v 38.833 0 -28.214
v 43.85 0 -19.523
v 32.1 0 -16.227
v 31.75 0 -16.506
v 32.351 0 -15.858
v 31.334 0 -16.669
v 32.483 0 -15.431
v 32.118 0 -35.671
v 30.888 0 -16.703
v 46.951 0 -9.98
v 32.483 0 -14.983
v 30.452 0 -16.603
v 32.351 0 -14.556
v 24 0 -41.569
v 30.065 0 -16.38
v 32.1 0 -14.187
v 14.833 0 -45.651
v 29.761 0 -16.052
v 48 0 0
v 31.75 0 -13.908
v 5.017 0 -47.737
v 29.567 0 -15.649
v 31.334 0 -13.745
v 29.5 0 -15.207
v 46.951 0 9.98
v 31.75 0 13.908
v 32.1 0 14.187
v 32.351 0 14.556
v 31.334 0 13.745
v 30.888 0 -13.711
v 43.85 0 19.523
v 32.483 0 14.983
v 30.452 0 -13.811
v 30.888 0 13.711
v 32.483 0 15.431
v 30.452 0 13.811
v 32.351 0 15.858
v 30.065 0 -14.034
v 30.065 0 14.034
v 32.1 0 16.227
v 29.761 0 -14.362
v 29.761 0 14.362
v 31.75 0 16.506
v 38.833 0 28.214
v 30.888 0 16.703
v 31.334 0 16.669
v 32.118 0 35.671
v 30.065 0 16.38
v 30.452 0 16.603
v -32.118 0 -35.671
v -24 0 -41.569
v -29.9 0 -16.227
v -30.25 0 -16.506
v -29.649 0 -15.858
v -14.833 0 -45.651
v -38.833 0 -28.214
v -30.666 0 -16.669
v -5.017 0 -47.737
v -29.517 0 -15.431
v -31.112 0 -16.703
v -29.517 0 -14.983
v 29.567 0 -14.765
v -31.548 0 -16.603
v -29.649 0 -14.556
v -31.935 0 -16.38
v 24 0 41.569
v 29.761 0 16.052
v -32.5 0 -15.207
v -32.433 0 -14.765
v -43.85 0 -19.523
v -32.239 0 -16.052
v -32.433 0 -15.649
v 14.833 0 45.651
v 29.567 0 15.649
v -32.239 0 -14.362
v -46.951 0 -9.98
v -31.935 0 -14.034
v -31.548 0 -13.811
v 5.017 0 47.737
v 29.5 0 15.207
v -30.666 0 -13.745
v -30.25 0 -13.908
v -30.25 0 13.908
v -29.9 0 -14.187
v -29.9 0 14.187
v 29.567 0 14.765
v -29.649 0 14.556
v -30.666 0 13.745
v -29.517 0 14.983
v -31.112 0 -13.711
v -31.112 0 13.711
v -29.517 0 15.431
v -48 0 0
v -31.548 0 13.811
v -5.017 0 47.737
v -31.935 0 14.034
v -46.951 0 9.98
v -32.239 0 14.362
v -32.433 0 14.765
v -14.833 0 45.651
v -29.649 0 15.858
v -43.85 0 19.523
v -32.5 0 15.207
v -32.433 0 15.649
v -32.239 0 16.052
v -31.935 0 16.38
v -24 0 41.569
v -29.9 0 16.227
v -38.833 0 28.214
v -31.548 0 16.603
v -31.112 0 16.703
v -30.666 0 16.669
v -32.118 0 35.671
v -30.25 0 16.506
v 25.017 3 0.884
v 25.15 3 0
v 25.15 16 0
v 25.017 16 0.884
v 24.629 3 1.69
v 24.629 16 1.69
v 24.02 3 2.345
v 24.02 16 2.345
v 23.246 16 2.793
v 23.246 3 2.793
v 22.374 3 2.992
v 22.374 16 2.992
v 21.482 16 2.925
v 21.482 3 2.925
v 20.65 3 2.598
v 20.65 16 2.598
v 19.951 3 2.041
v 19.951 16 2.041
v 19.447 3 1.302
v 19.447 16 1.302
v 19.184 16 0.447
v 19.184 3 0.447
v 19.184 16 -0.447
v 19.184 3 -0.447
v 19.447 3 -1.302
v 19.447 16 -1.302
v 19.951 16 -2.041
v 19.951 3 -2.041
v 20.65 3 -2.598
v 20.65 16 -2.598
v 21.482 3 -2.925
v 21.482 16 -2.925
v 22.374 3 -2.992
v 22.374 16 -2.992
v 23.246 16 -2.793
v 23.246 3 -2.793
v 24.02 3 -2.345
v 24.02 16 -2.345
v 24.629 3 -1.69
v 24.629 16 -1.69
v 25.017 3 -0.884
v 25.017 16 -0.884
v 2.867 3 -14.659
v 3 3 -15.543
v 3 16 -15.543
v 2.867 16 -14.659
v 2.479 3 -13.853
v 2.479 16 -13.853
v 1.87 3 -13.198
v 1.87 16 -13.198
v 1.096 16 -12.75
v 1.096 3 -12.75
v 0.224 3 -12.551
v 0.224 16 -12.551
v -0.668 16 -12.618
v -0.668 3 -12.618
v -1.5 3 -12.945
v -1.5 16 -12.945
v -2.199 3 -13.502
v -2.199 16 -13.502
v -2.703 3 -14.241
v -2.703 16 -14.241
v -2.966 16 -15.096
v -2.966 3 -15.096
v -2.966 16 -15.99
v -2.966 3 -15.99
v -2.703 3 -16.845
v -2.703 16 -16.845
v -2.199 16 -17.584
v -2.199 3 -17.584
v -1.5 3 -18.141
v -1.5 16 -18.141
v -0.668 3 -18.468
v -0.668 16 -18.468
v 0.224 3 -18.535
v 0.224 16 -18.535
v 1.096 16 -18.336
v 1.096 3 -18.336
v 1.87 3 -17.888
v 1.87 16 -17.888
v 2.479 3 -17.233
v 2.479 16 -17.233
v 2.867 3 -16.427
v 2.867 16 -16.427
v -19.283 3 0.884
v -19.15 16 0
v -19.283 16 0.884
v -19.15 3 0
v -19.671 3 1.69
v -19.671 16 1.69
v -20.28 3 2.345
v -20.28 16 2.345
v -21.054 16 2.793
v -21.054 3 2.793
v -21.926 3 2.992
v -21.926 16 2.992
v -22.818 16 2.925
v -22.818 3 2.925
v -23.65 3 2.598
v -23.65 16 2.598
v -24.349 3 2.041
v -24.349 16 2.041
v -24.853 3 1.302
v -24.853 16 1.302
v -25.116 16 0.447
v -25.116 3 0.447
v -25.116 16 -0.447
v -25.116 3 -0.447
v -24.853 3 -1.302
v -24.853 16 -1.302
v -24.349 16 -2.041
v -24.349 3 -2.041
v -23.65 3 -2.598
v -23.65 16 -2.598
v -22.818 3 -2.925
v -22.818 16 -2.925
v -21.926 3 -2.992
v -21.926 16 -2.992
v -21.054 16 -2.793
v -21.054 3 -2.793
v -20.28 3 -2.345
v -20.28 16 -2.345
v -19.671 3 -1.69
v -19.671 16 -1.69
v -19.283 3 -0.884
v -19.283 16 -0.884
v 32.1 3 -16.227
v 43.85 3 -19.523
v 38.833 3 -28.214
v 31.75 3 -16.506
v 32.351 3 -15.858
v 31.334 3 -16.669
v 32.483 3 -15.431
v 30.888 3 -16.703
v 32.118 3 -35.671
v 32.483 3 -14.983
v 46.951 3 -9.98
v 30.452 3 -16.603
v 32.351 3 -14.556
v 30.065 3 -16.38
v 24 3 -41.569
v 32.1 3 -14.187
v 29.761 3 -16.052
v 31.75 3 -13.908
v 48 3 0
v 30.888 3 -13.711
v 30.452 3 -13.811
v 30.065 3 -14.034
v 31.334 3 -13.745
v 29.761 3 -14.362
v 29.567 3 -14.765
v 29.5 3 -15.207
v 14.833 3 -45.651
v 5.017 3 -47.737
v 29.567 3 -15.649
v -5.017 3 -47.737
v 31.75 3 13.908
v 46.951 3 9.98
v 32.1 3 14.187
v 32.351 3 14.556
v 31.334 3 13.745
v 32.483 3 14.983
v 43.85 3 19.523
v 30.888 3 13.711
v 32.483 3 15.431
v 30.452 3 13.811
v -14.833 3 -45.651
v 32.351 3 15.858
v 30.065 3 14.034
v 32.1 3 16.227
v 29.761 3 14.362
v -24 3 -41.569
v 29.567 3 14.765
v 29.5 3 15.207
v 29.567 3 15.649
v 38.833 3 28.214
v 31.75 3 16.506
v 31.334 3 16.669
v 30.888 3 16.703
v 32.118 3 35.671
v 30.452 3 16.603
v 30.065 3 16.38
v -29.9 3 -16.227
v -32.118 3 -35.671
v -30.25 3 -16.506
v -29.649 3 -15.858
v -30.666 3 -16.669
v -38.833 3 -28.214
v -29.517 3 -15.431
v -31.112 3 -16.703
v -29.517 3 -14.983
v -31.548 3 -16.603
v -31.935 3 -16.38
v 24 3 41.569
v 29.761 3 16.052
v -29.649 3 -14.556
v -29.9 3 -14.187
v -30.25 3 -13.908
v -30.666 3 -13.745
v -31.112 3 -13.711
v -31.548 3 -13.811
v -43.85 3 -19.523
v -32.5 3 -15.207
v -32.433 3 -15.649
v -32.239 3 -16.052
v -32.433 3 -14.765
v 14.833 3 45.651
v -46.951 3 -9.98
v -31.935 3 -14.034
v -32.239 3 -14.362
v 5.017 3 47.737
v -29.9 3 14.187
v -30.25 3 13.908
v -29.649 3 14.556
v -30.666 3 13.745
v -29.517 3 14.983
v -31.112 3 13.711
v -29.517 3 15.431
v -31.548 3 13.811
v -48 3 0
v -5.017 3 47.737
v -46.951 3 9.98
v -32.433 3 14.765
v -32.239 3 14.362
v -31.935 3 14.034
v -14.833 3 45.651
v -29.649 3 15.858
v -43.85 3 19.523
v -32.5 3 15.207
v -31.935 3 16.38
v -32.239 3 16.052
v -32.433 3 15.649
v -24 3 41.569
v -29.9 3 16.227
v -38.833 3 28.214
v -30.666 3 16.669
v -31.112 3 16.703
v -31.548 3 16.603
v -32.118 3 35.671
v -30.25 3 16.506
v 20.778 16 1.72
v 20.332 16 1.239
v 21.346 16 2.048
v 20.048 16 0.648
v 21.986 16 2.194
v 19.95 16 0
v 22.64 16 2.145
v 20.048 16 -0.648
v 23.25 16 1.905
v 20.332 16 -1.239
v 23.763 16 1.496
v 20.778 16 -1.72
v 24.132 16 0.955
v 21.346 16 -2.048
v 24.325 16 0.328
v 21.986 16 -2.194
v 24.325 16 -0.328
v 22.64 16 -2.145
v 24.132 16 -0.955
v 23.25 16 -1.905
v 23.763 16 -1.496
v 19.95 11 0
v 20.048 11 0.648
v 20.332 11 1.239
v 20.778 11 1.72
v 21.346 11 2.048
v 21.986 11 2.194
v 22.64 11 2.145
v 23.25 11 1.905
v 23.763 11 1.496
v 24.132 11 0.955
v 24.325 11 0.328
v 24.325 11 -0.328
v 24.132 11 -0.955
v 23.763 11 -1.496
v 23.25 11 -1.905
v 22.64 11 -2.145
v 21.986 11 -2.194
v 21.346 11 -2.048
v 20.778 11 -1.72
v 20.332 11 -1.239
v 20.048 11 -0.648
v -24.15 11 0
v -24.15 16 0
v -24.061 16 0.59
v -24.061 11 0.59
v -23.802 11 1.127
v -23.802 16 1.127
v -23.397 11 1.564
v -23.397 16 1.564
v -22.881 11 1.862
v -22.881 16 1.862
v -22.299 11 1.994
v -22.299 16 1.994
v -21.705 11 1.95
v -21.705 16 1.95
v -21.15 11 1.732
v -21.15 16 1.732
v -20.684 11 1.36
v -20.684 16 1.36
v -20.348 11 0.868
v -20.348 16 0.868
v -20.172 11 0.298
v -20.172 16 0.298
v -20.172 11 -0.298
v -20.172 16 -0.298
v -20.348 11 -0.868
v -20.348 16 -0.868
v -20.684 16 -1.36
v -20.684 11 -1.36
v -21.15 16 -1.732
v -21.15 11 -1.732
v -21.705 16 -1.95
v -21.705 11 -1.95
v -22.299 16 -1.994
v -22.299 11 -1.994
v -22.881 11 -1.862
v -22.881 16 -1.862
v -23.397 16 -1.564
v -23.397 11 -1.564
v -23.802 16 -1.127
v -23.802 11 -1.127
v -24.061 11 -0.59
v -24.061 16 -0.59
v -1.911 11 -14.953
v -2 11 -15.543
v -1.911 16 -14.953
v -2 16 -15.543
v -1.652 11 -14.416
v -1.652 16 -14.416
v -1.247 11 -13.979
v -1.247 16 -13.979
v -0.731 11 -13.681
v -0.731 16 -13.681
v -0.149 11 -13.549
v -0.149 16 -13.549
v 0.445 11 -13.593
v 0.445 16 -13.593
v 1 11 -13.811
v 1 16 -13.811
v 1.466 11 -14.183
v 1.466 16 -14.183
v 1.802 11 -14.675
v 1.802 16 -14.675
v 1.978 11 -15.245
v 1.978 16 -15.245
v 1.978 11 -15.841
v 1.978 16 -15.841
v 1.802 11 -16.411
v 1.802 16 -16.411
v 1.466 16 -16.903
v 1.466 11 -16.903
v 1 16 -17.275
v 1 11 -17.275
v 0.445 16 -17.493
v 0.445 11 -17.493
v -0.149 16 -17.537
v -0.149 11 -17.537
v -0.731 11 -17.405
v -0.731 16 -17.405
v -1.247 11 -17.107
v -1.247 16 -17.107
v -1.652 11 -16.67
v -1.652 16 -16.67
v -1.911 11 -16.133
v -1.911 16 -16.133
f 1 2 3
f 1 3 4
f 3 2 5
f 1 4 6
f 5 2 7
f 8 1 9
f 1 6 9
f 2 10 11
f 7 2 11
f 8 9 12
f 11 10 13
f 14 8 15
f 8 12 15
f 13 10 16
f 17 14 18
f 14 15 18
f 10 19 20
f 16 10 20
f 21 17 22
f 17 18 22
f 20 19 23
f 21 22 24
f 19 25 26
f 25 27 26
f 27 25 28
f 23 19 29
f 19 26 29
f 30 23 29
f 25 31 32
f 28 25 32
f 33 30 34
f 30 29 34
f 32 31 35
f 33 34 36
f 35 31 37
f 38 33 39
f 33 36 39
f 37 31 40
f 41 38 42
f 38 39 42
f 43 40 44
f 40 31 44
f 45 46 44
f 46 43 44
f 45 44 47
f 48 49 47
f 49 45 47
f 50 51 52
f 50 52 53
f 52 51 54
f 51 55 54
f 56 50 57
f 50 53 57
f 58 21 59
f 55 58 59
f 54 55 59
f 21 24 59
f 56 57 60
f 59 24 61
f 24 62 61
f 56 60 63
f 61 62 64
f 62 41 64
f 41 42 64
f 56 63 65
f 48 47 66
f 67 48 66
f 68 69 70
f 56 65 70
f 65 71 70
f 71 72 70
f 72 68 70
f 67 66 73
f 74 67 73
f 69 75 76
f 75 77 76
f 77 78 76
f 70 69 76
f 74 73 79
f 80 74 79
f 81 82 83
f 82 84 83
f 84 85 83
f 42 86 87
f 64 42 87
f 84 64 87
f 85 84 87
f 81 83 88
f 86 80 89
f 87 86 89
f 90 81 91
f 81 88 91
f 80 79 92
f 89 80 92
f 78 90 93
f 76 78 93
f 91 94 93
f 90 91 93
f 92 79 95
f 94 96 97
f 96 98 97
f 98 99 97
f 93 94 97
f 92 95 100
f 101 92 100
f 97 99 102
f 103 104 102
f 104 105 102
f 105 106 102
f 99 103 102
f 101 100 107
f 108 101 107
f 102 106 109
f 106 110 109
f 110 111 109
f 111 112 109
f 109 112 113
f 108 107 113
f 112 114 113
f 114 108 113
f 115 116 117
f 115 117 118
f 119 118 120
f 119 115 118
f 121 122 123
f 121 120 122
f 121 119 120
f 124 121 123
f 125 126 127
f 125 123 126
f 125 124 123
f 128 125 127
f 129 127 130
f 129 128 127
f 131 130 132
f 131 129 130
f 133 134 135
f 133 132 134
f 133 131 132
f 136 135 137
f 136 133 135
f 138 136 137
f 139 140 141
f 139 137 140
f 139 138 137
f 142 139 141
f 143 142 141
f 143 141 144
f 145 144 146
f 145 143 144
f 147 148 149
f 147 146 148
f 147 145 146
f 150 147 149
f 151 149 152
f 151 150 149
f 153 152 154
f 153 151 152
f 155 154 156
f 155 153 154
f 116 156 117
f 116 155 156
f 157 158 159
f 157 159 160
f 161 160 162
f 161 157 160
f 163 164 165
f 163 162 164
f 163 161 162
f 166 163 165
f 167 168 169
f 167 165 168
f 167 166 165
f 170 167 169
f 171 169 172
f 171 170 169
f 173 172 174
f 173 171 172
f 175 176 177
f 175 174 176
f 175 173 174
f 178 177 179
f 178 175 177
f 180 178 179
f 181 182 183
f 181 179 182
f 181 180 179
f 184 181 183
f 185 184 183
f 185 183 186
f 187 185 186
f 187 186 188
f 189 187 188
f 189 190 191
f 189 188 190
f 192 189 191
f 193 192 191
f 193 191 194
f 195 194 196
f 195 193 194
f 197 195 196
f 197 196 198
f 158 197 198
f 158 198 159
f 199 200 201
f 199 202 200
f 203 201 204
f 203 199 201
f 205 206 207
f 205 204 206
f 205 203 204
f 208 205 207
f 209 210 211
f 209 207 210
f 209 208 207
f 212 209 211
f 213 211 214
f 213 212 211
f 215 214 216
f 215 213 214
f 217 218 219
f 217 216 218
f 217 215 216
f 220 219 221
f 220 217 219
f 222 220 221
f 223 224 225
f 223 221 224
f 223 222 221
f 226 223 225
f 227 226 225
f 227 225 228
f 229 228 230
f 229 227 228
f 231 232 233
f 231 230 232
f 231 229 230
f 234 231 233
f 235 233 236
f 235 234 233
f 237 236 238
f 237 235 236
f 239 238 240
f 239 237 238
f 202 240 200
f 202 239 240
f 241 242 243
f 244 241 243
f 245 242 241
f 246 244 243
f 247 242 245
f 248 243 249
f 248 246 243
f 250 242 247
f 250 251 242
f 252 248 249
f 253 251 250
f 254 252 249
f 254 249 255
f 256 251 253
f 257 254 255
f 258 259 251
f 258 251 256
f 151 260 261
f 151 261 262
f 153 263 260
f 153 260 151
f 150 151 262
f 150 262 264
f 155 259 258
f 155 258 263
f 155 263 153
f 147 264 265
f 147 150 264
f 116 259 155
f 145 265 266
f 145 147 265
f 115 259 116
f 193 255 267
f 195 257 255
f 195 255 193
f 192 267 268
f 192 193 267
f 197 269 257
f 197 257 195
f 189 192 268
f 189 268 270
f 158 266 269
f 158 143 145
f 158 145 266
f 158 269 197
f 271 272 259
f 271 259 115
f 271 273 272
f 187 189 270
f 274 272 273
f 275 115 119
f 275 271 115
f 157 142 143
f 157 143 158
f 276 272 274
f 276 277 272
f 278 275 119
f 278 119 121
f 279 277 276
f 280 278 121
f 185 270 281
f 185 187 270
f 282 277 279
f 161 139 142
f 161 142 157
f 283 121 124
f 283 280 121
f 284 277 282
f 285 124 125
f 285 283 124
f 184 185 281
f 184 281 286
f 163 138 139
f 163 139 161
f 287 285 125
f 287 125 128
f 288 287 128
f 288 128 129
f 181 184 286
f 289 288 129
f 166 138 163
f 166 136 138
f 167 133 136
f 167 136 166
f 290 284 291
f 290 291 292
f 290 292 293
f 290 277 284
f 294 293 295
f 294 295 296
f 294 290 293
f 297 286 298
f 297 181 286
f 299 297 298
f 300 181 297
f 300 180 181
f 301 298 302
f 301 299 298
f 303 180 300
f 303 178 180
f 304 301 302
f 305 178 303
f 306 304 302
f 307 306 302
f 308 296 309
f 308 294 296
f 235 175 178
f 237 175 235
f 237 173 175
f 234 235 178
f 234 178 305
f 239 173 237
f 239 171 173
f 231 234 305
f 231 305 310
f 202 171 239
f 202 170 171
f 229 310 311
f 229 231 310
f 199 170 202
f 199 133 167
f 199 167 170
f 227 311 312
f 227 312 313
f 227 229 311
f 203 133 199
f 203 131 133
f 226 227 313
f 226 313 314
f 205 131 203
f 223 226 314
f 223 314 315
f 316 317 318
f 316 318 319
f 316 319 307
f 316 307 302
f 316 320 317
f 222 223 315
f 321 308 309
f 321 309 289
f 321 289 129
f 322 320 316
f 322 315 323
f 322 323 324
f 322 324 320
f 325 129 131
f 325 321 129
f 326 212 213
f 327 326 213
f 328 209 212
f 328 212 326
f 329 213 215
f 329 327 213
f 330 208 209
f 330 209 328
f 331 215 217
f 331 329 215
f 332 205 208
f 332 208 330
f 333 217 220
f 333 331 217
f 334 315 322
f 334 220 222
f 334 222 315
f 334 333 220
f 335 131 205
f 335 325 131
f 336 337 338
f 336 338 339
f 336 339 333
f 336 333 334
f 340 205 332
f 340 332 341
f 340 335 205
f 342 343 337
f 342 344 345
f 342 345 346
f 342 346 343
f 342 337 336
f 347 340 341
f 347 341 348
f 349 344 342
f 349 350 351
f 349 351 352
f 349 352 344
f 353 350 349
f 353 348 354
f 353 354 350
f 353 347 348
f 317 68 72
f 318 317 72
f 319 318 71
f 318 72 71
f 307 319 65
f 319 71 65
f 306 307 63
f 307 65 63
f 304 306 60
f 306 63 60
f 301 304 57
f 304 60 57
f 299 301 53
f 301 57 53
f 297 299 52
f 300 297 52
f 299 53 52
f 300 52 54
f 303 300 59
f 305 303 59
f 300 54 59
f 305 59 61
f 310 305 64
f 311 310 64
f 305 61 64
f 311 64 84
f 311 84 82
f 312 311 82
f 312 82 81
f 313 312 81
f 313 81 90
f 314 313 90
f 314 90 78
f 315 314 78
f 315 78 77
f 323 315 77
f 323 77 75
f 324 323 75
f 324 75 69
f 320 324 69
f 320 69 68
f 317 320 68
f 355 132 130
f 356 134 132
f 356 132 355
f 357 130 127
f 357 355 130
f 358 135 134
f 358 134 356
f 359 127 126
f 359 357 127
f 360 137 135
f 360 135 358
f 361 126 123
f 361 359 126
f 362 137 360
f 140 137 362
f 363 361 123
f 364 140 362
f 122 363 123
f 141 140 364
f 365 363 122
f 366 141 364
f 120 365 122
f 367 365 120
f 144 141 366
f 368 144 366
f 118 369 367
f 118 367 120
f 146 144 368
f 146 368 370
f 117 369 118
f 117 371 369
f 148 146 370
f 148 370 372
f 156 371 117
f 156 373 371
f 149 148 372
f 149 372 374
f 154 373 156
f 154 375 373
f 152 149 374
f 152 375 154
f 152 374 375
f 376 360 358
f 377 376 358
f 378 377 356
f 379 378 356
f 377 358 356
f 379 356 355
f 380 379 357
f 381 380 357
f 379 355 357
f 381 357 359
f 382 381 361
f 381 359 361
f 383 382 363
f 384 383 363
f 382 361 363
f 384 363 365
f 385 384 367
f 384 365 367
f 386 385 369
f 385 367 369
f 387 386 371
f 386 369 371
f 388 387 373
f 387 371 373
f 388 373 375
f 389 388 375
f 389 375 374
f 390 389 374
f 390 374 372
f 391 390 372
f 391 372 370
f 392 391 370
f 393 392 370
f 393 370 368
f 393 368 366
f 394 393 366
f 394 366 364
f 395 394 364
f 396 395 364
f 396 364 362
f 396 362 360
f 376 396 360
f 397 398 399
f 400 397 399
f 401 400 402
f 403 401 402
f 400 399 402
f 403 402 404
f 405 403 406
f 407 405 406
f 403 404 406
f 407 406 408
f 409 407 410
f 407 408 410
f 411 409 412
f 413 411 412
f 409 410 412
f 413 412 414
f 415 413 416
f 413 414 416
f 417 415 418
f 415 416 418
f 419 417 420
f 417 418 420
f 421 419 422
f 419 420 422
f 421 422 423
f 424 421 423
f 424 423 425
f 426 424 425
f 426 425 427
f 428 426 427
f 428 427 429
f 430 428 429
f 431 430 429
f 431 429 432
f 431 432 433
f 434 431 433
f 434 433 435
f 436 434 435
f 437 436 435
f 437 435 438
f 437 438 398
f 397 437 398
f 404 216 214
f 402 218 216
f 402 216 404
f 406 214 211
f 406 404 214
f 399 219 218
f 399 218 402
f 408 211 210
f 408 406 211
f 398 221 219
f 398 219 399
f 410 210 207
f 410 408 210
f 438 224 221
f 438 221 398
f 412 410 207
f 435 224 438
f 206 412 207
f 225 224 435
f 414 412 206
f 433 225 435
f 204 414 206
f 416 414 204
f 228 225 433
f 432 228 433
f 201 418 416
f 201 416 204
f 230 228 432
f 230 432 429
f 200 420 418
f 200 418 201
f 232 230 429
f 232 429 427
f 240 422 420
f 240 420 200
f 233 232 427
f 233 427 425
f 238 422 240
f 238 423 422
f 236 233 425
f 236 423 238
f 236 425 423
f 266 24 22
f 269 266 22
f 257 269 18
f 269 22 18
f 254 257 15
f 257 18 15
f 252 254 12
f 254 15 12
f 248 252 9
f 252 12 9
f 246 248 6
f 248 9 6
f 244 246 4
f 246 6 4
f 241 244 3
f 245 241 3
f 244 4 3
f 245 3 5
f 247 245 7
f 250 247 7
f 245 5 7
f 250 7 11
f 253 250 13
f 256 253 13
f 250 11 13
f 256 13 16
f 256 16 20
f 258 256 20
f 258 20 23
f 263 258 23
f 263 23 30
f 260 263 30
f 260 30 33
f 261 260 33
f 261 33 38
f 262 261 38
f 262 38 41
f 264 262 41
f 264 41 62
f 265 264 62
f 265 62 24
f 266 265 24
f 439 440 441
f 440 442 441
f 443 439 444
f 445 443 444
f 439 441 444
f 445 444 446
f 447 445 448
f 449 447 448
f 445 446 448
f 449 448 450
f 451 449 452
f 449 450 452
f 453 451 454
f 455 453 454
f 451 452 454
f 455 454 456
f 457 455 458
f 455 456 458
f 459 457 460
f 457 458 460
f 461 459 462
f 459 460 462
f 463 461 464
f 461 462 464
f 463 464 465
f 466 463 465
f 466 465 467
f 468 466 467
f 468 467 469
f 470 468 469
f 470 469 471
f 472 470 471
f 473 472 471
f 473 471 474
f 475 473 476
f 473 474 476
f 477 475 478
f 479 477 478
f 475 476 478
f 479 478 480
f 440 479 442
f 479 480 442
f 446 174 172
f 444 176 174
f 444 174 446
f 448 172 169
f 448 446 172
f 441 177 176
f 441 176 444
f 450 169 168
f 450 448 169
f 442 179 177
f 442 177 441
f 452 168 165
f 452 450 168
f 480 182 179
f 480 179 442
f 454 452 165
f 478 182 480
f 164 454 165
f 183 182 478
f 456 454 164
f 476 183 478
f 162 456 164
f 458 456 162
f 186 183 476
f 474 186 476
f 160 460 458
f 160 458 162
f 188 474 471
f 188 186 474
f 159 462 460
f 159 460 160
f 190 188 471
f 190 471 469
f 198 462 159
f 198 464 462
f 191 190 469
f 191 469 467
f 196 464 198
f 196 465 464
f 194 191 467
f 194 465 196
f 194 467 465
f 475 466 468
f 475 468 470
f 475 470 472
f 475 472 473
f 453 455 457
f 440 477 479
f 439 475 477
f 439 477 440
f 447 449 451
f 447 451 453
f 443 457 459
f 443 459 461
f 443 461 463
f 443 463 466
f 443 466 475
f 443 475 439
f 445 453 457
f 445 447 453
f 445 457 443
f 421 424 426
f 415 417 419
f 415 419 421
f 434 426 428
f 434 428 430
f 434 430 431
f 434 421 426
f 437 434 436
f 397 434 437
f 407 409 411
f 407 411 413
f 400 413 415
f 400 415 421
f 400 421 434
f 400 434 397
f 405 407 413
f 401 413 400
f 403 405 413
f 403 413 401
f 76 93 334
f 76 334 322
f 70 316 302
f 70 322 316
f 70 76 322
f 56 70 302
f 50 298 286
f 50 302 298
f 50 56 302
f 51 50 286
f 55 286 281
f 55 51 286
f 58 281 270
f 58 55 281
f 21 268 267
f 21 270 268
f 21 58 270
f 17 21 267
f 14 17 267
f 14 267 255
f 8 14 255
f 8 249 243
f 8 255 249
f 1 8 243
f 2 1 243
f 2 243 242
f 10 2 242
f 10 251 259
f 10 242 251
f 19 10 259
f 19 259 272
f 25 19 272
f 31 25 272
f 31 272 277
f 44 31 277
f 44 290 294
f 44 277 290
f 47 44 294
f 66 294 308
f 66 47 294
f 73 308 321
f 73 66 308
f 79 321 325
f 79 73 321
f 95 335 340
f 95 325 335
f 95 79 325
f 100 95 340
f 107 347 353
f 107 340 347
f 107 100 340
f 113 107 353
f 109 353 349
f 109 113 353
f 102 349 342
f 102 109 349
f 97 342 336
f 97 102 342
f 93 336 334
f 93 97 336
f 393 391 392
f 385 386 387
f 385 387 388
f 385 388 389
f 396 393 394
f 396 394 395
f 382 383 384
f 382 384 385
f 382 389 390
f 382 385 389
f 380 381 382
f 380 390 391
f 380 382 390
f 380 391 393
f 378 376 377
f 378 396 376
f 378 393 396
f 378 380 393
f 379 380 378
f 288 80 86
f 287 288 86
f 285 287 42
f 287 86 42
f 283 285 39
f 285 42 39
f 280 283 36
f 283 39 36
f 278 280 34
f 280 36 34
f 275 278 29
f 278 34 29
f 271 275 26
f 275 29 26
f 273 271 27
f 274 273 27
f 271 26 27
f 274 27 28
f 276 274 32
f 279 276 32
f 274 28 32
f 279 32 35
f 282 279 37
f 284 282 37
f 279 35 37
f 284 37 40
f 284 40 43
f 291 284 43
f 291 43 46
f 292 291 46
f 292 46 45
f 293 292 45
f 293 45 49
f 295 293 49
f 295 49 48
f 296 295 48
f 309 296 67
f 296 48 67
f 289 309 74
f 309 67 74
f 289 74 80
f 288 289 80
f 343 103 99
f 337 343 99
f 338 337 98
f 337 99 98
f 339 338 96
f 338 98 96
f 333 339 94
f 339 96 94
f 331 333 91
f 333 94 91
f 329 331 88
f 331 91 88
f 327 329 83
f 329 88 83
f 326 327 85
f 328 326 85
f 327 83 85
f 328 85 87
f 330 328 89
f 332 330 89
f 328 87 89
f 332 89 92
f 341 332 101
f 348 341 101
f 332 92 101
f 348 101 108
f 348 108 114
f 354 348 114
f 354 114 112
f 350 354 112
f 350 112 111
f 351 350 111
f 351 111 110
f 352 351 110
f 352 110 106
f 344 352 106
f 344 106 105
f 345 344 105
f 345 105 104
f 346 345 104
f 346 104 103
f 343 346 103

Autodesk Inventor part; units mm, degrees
ref_plane "YZ Plane" through (0, 0, 0) normal (1, 0, 0) x (0, 1, 0)
ref_plane "XZ Plane" through (0, 0, 0) normal (0, 1, 0) x (-1, 0, 0)
ref_plane "XY Plane" through (0, 0, 0) normal (0, 0, 1) x (1, 0, 0)
sketch "Эскиз1" plane through (0, 0, 0) normal (0, 1, 0) x (-1, 0, 0)
  circle A0 centre (0, 0) radius 48
  line L0 (31, 15.207) -> (-31, 15.207)
  line L1 (-31, 15.207) -> (-31, -15.207)
  line L2 (-31, -15.207) -> (31, -15.207)
  line L3 (31, -15.207) -> (31, 15.207)
  circle A1 centre (31, 15.207) radius 1.5
  circle A2 centre (31, -15.207) radius 1.5
  circle A3 centre (-31, 15.207) radius 1.5
  circle A4 centre (-31, -15.207) radius 1.5
  dimension "d0" = 96
  dimension "d1" = 62
  dimension "d2" = 30.414
  dimension "d3" = 31
  dimension "d4" = 15.207
  dimension "d5" = 3
  dimension "d6" = 3
  dimension "d7" = 3
  dimension "d8" = 3
extrude "Выдавливание1" add sketch "Эскиз1" along normal blind 3 contours A0 | L0 A1 L3 A2 L2 A4 L1 A3
sketch "Эскиз2" plane through (0, 3, 0) normal (0, 1, 0) x (1, 0, 0)
  circle A0 centre (0, 0) radius 27.25
  circle A1 centre (-22.15, 0) radius 3
  circle A2 centre (22.15, 0) radius 3
  circle A3 centre (0, 15.543) radius 3
  dimension "d11" = 54.5
  dimension "d12" = 6
  dimension "d13" = 6
  dimension "d14" = 44.3
  dimension "d15" = 22.15
  dimension "d16" = 6
  dimension "d17" = 15.543
extrude "Выдавливание2" add sketch "Эскиз2" along normal blind 13 contours A1 | A2 | A3
sketch "Эскиз3" plane through (0, 16, -15.543) normal (0, 1, 0) x (-1, 0, 0)
  circle A0 centre (0, 0) radius 2
  circle A1 centre (-22.15, 15.543) radius 2.2
  circle A2 centre (22.15, 15.543) radius 2
  circle A3 centre (22.15, 15.543) radius 3
  circle A4 centre (22.15, 15.543) radius 3 projected
  circle A5 centre (0, 0) radius 3
  circle A6 centre (0, 0) radius 3 projected
  circle A7 centre (-22.15, 15.543) radius 3
  circle A8 centre (-22.15, 15.543) radius 3 projected
  point P0 (0, 15.543)
  dimension "d20" = 4
  dimension "d21" = 4.4
  dimension "d22" = 4
  dimension "d23" = 6
  dimension "d24" = 6
  dimension "d25" = 6
extrude "Выдавливание3" cut sketch "Эскиз3" against normal blind 5 contours A0 | A1 | A2
properties part number "openmv"
